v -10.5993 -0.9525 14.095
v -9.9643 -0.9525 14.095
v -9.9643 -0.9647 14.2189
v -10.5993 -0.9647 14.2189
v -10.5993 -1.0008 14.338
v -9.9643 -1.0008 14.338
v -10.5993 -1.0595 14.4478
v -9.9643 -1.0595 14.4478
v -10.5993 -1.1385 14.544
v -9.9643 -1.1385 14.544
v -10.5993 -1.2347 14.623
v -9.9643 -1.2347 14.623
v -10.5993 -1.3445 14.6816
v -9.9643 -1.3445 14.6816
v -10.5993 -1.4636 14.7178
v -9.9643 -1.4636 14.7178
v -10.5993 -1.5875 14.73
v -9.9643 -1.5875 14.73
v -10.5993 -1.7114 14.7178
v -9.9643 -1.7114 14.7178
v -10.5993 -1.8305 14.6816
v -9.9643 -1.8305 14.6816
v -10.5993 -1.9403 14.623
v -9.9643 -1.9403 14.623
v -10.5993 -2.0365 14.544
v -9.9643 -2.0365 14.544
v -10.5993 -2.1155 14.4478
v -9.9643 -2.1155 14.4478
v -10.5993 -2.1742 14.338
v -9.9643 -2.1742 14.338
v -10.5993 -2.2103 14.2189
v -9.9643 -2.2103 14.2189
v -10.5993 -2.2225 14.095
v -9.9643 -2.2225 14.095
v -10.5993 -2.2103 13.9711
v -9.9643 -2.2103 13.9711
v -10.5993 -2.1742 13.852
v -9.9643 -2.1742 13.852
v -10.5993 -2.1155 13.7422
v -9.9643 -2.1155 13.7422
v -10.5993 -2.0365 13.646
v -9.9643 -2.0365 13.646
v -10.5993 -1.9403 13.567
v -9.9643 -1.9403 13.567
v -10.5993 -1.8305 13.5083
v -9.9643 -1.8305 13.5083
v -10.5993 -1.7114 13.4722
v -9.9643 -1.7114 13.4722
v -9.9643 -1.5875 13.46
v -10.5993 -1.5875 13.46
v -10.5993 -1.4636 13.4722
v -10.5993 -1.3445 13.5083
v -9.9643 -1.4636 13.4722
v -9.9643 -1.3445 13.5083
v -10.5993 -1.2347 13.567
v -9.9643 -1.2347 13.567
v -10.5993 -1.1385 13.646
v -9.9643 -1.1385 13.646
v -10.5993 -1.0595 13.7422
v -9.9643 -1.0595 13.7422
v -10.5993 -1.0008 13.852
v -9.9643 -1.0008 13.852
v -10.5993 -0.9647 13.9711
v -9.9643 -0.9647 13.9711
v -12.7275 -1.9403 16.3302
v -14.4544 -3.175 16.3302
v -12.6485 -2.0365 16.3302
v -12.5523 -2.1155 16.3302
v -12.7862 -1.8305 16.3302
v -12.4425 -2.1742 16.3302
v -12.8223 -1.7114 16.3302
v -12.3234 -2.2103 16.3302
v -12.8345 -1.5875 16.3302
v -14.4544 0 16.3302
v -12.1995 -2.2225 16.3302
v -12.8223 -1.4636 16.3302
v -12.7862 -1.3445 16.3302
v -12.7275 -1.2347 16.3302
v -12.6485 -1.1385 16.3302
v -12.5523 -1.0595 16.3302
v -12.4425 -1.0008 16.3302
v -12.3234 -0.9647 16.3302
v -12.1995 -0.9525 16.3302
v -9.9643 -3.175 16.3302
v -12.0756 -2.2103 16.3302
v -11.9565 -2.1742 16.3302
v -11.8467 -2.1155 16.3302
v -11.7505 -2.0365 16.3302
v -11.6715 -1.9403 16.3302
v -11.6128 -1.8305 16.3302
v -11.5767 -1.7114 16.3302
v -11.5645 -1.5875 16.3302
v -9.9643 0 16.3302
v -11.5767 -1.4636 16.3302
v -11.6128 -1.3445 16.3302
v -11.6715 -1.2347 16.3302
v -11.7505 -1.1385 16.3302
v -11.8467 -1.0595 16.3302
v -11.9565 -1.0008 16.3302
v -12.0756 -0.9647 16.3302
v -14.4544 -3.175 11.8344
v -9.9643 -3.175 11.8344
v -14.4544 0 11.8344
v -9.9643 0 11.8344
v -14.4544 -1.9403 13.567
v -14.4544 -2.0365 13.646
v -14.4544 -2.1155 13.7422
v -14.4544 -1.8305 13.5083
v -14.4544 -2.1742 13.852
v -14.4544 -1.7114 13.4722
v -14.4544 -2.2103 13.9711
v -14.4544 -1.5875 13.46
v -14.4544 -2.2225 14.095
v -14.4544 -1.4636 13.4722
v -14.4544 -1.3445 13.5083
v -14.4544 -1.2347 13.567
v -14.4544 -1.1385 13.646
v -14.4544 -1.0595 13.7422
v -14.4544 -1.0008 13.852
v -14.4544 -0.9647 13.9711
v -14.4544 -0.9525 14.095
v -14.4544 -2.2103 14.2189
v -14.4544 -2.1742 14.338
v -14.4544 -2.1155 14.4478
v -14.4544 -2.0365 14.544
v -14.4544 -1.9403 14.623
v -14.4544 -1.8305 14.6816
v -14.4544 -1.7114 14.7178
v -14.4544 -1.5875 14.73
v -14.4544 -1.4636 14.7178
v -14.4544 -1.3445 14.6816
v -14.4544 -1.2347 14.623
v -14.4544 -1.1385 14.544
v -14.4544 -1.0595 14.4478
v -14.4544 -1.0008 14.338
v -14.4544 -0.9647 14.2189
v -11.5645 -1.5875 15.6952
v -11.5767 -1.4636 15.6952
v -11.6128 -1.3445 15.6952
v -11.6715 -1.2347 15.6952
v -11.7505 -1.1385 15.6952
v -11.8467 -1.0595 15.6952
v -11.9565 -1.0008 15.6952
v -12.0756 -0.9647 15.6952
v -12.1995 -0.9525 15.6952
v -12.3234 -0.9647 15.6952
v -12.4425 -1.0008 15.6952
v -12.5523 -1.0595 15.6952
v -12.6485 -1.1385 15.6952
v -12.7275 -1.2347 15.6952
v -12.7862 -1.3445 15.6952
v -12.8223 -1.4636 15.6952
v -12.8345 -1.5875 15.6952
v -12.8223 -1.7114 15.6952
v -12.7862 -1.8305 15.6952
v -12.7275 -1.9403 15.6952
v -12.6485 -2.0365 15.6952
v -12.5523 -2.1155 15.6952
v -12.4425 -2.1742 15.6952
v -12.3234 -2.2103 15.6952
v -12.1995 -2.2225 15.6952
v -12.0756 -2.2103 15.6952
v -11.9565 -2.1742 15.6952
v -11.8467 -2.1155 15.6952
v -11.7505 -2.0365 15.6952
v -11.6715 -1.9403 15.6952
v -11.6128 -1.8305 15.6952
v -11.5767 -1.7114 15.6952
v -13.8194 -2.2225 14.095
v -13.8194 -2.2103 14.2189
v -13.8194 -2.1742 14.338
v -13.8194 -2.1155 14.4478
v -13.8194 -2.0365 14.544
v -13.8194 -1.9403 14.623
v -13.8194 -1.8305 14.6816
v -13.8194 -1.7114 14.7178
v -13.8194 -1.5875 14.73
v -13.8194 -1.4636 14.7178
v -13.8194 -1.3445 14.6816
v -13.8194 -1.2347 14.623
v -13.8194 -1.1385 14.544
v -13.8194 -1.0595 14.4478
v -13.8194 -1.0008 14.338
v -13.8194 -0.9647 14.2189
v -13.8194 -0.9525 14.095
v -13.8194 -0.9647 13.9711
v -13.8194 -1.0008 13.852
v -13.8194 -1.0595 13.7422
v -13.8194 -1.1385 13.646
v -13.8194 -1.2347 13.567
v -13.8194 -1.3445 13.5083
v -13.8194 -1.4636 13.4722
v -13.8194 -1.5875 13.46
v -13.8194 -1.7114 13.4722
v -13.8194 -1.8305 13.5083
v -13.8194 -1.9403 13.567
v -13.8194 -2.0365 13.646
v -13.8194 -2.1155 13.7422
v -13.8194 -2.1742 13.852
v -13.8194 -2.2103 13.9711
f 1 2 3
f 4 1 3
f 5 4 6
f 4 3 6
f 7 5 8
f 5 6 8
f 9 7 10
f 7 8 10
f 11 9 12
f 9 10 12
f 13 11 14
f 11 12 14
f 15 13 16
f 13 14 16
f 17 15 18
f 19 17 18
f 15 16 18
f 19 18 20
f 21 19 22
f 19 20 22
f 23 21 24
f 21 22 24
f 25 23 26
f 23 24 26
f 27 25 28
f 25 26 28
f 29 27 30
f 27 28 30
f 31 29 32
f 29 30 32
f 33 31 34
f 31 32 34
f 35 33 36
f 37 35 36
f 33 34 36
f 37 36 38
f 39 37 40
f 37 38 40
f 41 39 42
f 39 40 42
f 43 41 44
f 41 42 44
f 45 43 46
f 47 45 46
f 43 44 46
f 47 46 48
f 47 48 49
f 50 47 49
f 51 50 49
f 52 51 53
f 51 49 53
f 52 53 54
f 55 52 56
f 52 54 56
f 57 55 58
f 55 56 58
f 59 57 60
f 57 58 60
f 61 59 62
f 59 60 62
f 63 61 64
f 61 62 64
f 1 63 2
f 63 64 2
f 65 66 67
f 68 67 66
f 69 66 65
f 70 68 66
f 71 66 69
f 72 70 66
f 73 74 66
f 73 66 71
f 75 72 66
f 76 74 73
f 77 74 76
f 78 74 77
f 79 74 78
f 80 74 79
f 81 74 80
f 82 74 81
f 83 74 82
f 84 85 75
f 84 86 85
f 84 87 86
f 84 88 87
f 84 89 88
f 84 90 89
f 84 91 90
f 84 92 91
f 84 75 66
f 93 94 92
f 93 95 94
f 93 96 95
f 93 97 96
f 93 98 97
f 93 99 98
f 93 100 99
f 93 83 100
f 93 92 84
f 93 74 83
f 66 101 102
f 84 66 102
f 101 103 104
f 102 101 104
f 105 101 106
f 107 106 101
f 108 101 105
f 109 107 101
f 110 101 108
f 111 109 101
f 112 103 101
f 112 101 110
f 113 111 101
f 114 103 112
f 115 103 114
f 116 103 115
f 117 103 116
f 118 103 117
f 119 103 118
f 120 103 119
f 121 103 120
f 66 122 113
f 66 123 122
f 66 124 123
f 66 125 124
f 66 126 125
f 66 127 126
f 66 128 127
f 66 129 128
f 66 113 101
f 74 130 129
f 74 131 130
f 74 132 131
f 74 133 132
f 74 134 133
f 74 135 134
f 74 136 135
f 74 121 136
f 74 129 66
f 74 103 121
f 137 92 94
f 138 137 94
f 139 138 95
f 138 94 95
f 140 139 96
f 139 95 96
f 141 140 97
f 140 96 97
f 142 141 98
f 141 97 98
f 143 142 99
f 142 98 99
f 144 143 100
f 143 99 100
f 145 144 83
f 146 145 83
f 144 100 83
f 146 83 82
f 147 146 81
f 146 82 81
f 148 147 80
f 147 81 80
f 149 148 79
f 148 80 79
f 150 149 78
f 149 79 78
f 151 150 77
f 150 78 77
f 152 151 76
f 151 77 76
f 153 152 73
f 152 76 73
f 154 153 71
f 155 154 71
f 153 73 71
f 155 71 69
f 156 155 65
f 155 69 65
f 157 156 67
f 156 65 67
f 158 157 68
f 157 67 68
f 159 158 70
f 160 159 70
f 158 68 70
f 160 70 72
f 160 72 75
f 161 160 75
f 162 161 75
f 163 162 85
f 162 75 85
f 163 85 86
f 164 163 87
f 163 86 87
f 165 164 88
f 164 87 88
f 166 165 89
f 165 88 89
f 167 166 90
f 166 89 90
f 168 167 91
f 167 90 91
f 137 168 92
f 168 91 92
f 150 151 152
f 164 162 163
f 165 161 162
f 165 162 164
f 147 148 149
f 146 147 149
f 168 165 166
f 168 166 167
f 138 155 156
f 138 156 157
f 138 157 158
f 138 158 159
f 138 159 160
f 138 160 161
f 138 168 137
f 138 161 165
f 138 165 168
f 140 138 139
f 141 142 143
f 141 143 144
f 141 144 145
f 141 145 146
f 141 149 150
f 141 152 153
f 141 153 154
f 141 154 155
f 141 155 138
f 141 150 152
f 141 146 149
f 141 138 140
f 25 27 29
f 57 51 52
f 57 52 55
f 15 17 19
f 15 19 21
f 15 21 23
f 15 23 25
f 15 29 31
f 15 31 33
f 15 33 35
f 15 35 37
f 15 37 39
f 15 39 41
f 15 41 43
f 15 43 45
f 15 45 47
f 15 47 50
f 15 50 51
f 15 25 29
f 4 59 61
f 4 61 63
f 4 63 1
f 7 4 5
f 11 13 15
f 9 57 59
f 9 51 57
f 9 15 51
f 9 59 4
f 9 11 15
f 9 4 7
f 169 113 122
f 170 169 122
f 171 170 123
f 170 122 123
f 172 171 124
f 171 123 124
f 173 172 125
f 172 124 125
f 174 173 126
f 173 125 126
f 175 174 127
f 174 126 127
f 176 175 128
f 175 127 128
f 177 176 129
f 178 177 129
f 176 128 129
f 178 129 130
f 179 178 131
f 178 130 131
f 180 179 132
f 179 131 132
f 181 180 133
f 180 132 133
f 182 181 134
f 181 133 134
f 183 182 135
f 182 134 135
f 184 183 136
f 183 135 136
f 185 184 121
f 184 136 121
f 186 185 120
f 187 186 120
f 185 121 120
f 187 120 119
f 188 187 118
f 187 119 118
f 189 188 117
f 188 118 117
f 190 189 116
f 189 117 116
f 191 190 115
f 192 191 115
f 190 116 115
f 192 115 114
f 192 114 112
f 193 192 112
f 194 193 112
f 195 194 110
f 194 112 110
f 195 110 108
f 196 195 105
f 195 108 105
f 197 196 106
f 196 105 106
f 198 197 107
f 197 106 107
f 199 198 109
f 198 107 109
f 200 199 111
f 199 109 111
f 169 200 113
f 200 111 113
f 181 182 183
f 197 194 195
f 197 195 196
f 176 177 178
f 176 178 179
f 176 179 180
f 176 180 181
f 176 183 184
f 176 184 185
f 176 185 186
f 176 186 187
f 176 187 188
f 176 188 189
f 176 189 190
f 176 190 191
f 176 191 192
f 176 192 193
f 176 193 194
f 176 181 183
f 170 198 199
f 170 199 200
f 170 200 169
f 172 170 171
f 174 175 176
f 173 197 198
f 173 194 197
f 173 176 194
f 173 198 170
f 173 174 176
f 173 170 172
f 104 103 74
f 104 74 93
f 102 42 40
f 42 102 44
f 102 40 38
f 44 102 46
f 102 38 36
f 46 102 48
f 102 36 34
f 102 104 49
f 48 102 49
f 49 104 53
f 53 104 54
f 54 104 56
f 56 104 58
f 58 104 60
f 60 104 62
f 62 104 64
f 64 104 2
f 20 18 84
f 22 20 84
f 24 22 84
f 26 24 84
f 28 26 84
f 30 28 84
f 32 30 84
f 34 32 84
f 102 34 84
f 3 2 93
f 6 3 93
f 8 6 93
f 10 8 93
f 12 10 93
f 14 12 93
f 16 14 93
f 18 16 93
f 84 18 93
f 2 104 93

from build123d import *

# Parameters (mm, degrees)
F0_W     = 4.4901358
F0_H     = 4.4958
F1_DEPTH = 3.175
F2_R     = 0.635
F3_DEPTH = 0.635
F4_R     = 0.635
F5_DEPTH = 0.635
F6_R     = 0.635
F7_DEPTH = 0.635


with BuildPart() as f1:
    # F0 (on Front) → F1 (new body)
    with BuildSketch(Plane.XZ):
        with Locations((-12.2093705867, 14.0822748512)):
            Rectangle(F0_W, F0_H)
    extrude(amount=F1_DEPTH)

    # F2 (on face) → F3 (cut)
    with BuildSketch(Plane.YZ.offset(-9.9643026867)):
        with Locations((-1.5875, 14.0949748512)):
            Circle(F2_R)
    extrude(amount=-F3_DEPTH, mode=Mode.SUBTRACT)

    # F4 (on face) → F5 (cut)
    with BuildSketch(Plane(origin=(-14.4544384867, 0, 0), x_dir=(0, -1, 0), z_dir=(-1, 0, 0))):
        with Locations((1.5875, 14.0949748512)):
            Circle(F4_R)
    extrude(amount=-F5_DEPTH, mode=Mode.SUBTRACT)

    # F6 (on face) → F7 (cut)
    with BuildSketch(Plane.XY.offset(16.3301748512)):
        with Locations((-12.1995026867, -1.5875)):
            Circle(F6_R)
    extrude(amount=-F7_DEPTH, mode=Mode.SUBTRACT)


solid = f1.part
